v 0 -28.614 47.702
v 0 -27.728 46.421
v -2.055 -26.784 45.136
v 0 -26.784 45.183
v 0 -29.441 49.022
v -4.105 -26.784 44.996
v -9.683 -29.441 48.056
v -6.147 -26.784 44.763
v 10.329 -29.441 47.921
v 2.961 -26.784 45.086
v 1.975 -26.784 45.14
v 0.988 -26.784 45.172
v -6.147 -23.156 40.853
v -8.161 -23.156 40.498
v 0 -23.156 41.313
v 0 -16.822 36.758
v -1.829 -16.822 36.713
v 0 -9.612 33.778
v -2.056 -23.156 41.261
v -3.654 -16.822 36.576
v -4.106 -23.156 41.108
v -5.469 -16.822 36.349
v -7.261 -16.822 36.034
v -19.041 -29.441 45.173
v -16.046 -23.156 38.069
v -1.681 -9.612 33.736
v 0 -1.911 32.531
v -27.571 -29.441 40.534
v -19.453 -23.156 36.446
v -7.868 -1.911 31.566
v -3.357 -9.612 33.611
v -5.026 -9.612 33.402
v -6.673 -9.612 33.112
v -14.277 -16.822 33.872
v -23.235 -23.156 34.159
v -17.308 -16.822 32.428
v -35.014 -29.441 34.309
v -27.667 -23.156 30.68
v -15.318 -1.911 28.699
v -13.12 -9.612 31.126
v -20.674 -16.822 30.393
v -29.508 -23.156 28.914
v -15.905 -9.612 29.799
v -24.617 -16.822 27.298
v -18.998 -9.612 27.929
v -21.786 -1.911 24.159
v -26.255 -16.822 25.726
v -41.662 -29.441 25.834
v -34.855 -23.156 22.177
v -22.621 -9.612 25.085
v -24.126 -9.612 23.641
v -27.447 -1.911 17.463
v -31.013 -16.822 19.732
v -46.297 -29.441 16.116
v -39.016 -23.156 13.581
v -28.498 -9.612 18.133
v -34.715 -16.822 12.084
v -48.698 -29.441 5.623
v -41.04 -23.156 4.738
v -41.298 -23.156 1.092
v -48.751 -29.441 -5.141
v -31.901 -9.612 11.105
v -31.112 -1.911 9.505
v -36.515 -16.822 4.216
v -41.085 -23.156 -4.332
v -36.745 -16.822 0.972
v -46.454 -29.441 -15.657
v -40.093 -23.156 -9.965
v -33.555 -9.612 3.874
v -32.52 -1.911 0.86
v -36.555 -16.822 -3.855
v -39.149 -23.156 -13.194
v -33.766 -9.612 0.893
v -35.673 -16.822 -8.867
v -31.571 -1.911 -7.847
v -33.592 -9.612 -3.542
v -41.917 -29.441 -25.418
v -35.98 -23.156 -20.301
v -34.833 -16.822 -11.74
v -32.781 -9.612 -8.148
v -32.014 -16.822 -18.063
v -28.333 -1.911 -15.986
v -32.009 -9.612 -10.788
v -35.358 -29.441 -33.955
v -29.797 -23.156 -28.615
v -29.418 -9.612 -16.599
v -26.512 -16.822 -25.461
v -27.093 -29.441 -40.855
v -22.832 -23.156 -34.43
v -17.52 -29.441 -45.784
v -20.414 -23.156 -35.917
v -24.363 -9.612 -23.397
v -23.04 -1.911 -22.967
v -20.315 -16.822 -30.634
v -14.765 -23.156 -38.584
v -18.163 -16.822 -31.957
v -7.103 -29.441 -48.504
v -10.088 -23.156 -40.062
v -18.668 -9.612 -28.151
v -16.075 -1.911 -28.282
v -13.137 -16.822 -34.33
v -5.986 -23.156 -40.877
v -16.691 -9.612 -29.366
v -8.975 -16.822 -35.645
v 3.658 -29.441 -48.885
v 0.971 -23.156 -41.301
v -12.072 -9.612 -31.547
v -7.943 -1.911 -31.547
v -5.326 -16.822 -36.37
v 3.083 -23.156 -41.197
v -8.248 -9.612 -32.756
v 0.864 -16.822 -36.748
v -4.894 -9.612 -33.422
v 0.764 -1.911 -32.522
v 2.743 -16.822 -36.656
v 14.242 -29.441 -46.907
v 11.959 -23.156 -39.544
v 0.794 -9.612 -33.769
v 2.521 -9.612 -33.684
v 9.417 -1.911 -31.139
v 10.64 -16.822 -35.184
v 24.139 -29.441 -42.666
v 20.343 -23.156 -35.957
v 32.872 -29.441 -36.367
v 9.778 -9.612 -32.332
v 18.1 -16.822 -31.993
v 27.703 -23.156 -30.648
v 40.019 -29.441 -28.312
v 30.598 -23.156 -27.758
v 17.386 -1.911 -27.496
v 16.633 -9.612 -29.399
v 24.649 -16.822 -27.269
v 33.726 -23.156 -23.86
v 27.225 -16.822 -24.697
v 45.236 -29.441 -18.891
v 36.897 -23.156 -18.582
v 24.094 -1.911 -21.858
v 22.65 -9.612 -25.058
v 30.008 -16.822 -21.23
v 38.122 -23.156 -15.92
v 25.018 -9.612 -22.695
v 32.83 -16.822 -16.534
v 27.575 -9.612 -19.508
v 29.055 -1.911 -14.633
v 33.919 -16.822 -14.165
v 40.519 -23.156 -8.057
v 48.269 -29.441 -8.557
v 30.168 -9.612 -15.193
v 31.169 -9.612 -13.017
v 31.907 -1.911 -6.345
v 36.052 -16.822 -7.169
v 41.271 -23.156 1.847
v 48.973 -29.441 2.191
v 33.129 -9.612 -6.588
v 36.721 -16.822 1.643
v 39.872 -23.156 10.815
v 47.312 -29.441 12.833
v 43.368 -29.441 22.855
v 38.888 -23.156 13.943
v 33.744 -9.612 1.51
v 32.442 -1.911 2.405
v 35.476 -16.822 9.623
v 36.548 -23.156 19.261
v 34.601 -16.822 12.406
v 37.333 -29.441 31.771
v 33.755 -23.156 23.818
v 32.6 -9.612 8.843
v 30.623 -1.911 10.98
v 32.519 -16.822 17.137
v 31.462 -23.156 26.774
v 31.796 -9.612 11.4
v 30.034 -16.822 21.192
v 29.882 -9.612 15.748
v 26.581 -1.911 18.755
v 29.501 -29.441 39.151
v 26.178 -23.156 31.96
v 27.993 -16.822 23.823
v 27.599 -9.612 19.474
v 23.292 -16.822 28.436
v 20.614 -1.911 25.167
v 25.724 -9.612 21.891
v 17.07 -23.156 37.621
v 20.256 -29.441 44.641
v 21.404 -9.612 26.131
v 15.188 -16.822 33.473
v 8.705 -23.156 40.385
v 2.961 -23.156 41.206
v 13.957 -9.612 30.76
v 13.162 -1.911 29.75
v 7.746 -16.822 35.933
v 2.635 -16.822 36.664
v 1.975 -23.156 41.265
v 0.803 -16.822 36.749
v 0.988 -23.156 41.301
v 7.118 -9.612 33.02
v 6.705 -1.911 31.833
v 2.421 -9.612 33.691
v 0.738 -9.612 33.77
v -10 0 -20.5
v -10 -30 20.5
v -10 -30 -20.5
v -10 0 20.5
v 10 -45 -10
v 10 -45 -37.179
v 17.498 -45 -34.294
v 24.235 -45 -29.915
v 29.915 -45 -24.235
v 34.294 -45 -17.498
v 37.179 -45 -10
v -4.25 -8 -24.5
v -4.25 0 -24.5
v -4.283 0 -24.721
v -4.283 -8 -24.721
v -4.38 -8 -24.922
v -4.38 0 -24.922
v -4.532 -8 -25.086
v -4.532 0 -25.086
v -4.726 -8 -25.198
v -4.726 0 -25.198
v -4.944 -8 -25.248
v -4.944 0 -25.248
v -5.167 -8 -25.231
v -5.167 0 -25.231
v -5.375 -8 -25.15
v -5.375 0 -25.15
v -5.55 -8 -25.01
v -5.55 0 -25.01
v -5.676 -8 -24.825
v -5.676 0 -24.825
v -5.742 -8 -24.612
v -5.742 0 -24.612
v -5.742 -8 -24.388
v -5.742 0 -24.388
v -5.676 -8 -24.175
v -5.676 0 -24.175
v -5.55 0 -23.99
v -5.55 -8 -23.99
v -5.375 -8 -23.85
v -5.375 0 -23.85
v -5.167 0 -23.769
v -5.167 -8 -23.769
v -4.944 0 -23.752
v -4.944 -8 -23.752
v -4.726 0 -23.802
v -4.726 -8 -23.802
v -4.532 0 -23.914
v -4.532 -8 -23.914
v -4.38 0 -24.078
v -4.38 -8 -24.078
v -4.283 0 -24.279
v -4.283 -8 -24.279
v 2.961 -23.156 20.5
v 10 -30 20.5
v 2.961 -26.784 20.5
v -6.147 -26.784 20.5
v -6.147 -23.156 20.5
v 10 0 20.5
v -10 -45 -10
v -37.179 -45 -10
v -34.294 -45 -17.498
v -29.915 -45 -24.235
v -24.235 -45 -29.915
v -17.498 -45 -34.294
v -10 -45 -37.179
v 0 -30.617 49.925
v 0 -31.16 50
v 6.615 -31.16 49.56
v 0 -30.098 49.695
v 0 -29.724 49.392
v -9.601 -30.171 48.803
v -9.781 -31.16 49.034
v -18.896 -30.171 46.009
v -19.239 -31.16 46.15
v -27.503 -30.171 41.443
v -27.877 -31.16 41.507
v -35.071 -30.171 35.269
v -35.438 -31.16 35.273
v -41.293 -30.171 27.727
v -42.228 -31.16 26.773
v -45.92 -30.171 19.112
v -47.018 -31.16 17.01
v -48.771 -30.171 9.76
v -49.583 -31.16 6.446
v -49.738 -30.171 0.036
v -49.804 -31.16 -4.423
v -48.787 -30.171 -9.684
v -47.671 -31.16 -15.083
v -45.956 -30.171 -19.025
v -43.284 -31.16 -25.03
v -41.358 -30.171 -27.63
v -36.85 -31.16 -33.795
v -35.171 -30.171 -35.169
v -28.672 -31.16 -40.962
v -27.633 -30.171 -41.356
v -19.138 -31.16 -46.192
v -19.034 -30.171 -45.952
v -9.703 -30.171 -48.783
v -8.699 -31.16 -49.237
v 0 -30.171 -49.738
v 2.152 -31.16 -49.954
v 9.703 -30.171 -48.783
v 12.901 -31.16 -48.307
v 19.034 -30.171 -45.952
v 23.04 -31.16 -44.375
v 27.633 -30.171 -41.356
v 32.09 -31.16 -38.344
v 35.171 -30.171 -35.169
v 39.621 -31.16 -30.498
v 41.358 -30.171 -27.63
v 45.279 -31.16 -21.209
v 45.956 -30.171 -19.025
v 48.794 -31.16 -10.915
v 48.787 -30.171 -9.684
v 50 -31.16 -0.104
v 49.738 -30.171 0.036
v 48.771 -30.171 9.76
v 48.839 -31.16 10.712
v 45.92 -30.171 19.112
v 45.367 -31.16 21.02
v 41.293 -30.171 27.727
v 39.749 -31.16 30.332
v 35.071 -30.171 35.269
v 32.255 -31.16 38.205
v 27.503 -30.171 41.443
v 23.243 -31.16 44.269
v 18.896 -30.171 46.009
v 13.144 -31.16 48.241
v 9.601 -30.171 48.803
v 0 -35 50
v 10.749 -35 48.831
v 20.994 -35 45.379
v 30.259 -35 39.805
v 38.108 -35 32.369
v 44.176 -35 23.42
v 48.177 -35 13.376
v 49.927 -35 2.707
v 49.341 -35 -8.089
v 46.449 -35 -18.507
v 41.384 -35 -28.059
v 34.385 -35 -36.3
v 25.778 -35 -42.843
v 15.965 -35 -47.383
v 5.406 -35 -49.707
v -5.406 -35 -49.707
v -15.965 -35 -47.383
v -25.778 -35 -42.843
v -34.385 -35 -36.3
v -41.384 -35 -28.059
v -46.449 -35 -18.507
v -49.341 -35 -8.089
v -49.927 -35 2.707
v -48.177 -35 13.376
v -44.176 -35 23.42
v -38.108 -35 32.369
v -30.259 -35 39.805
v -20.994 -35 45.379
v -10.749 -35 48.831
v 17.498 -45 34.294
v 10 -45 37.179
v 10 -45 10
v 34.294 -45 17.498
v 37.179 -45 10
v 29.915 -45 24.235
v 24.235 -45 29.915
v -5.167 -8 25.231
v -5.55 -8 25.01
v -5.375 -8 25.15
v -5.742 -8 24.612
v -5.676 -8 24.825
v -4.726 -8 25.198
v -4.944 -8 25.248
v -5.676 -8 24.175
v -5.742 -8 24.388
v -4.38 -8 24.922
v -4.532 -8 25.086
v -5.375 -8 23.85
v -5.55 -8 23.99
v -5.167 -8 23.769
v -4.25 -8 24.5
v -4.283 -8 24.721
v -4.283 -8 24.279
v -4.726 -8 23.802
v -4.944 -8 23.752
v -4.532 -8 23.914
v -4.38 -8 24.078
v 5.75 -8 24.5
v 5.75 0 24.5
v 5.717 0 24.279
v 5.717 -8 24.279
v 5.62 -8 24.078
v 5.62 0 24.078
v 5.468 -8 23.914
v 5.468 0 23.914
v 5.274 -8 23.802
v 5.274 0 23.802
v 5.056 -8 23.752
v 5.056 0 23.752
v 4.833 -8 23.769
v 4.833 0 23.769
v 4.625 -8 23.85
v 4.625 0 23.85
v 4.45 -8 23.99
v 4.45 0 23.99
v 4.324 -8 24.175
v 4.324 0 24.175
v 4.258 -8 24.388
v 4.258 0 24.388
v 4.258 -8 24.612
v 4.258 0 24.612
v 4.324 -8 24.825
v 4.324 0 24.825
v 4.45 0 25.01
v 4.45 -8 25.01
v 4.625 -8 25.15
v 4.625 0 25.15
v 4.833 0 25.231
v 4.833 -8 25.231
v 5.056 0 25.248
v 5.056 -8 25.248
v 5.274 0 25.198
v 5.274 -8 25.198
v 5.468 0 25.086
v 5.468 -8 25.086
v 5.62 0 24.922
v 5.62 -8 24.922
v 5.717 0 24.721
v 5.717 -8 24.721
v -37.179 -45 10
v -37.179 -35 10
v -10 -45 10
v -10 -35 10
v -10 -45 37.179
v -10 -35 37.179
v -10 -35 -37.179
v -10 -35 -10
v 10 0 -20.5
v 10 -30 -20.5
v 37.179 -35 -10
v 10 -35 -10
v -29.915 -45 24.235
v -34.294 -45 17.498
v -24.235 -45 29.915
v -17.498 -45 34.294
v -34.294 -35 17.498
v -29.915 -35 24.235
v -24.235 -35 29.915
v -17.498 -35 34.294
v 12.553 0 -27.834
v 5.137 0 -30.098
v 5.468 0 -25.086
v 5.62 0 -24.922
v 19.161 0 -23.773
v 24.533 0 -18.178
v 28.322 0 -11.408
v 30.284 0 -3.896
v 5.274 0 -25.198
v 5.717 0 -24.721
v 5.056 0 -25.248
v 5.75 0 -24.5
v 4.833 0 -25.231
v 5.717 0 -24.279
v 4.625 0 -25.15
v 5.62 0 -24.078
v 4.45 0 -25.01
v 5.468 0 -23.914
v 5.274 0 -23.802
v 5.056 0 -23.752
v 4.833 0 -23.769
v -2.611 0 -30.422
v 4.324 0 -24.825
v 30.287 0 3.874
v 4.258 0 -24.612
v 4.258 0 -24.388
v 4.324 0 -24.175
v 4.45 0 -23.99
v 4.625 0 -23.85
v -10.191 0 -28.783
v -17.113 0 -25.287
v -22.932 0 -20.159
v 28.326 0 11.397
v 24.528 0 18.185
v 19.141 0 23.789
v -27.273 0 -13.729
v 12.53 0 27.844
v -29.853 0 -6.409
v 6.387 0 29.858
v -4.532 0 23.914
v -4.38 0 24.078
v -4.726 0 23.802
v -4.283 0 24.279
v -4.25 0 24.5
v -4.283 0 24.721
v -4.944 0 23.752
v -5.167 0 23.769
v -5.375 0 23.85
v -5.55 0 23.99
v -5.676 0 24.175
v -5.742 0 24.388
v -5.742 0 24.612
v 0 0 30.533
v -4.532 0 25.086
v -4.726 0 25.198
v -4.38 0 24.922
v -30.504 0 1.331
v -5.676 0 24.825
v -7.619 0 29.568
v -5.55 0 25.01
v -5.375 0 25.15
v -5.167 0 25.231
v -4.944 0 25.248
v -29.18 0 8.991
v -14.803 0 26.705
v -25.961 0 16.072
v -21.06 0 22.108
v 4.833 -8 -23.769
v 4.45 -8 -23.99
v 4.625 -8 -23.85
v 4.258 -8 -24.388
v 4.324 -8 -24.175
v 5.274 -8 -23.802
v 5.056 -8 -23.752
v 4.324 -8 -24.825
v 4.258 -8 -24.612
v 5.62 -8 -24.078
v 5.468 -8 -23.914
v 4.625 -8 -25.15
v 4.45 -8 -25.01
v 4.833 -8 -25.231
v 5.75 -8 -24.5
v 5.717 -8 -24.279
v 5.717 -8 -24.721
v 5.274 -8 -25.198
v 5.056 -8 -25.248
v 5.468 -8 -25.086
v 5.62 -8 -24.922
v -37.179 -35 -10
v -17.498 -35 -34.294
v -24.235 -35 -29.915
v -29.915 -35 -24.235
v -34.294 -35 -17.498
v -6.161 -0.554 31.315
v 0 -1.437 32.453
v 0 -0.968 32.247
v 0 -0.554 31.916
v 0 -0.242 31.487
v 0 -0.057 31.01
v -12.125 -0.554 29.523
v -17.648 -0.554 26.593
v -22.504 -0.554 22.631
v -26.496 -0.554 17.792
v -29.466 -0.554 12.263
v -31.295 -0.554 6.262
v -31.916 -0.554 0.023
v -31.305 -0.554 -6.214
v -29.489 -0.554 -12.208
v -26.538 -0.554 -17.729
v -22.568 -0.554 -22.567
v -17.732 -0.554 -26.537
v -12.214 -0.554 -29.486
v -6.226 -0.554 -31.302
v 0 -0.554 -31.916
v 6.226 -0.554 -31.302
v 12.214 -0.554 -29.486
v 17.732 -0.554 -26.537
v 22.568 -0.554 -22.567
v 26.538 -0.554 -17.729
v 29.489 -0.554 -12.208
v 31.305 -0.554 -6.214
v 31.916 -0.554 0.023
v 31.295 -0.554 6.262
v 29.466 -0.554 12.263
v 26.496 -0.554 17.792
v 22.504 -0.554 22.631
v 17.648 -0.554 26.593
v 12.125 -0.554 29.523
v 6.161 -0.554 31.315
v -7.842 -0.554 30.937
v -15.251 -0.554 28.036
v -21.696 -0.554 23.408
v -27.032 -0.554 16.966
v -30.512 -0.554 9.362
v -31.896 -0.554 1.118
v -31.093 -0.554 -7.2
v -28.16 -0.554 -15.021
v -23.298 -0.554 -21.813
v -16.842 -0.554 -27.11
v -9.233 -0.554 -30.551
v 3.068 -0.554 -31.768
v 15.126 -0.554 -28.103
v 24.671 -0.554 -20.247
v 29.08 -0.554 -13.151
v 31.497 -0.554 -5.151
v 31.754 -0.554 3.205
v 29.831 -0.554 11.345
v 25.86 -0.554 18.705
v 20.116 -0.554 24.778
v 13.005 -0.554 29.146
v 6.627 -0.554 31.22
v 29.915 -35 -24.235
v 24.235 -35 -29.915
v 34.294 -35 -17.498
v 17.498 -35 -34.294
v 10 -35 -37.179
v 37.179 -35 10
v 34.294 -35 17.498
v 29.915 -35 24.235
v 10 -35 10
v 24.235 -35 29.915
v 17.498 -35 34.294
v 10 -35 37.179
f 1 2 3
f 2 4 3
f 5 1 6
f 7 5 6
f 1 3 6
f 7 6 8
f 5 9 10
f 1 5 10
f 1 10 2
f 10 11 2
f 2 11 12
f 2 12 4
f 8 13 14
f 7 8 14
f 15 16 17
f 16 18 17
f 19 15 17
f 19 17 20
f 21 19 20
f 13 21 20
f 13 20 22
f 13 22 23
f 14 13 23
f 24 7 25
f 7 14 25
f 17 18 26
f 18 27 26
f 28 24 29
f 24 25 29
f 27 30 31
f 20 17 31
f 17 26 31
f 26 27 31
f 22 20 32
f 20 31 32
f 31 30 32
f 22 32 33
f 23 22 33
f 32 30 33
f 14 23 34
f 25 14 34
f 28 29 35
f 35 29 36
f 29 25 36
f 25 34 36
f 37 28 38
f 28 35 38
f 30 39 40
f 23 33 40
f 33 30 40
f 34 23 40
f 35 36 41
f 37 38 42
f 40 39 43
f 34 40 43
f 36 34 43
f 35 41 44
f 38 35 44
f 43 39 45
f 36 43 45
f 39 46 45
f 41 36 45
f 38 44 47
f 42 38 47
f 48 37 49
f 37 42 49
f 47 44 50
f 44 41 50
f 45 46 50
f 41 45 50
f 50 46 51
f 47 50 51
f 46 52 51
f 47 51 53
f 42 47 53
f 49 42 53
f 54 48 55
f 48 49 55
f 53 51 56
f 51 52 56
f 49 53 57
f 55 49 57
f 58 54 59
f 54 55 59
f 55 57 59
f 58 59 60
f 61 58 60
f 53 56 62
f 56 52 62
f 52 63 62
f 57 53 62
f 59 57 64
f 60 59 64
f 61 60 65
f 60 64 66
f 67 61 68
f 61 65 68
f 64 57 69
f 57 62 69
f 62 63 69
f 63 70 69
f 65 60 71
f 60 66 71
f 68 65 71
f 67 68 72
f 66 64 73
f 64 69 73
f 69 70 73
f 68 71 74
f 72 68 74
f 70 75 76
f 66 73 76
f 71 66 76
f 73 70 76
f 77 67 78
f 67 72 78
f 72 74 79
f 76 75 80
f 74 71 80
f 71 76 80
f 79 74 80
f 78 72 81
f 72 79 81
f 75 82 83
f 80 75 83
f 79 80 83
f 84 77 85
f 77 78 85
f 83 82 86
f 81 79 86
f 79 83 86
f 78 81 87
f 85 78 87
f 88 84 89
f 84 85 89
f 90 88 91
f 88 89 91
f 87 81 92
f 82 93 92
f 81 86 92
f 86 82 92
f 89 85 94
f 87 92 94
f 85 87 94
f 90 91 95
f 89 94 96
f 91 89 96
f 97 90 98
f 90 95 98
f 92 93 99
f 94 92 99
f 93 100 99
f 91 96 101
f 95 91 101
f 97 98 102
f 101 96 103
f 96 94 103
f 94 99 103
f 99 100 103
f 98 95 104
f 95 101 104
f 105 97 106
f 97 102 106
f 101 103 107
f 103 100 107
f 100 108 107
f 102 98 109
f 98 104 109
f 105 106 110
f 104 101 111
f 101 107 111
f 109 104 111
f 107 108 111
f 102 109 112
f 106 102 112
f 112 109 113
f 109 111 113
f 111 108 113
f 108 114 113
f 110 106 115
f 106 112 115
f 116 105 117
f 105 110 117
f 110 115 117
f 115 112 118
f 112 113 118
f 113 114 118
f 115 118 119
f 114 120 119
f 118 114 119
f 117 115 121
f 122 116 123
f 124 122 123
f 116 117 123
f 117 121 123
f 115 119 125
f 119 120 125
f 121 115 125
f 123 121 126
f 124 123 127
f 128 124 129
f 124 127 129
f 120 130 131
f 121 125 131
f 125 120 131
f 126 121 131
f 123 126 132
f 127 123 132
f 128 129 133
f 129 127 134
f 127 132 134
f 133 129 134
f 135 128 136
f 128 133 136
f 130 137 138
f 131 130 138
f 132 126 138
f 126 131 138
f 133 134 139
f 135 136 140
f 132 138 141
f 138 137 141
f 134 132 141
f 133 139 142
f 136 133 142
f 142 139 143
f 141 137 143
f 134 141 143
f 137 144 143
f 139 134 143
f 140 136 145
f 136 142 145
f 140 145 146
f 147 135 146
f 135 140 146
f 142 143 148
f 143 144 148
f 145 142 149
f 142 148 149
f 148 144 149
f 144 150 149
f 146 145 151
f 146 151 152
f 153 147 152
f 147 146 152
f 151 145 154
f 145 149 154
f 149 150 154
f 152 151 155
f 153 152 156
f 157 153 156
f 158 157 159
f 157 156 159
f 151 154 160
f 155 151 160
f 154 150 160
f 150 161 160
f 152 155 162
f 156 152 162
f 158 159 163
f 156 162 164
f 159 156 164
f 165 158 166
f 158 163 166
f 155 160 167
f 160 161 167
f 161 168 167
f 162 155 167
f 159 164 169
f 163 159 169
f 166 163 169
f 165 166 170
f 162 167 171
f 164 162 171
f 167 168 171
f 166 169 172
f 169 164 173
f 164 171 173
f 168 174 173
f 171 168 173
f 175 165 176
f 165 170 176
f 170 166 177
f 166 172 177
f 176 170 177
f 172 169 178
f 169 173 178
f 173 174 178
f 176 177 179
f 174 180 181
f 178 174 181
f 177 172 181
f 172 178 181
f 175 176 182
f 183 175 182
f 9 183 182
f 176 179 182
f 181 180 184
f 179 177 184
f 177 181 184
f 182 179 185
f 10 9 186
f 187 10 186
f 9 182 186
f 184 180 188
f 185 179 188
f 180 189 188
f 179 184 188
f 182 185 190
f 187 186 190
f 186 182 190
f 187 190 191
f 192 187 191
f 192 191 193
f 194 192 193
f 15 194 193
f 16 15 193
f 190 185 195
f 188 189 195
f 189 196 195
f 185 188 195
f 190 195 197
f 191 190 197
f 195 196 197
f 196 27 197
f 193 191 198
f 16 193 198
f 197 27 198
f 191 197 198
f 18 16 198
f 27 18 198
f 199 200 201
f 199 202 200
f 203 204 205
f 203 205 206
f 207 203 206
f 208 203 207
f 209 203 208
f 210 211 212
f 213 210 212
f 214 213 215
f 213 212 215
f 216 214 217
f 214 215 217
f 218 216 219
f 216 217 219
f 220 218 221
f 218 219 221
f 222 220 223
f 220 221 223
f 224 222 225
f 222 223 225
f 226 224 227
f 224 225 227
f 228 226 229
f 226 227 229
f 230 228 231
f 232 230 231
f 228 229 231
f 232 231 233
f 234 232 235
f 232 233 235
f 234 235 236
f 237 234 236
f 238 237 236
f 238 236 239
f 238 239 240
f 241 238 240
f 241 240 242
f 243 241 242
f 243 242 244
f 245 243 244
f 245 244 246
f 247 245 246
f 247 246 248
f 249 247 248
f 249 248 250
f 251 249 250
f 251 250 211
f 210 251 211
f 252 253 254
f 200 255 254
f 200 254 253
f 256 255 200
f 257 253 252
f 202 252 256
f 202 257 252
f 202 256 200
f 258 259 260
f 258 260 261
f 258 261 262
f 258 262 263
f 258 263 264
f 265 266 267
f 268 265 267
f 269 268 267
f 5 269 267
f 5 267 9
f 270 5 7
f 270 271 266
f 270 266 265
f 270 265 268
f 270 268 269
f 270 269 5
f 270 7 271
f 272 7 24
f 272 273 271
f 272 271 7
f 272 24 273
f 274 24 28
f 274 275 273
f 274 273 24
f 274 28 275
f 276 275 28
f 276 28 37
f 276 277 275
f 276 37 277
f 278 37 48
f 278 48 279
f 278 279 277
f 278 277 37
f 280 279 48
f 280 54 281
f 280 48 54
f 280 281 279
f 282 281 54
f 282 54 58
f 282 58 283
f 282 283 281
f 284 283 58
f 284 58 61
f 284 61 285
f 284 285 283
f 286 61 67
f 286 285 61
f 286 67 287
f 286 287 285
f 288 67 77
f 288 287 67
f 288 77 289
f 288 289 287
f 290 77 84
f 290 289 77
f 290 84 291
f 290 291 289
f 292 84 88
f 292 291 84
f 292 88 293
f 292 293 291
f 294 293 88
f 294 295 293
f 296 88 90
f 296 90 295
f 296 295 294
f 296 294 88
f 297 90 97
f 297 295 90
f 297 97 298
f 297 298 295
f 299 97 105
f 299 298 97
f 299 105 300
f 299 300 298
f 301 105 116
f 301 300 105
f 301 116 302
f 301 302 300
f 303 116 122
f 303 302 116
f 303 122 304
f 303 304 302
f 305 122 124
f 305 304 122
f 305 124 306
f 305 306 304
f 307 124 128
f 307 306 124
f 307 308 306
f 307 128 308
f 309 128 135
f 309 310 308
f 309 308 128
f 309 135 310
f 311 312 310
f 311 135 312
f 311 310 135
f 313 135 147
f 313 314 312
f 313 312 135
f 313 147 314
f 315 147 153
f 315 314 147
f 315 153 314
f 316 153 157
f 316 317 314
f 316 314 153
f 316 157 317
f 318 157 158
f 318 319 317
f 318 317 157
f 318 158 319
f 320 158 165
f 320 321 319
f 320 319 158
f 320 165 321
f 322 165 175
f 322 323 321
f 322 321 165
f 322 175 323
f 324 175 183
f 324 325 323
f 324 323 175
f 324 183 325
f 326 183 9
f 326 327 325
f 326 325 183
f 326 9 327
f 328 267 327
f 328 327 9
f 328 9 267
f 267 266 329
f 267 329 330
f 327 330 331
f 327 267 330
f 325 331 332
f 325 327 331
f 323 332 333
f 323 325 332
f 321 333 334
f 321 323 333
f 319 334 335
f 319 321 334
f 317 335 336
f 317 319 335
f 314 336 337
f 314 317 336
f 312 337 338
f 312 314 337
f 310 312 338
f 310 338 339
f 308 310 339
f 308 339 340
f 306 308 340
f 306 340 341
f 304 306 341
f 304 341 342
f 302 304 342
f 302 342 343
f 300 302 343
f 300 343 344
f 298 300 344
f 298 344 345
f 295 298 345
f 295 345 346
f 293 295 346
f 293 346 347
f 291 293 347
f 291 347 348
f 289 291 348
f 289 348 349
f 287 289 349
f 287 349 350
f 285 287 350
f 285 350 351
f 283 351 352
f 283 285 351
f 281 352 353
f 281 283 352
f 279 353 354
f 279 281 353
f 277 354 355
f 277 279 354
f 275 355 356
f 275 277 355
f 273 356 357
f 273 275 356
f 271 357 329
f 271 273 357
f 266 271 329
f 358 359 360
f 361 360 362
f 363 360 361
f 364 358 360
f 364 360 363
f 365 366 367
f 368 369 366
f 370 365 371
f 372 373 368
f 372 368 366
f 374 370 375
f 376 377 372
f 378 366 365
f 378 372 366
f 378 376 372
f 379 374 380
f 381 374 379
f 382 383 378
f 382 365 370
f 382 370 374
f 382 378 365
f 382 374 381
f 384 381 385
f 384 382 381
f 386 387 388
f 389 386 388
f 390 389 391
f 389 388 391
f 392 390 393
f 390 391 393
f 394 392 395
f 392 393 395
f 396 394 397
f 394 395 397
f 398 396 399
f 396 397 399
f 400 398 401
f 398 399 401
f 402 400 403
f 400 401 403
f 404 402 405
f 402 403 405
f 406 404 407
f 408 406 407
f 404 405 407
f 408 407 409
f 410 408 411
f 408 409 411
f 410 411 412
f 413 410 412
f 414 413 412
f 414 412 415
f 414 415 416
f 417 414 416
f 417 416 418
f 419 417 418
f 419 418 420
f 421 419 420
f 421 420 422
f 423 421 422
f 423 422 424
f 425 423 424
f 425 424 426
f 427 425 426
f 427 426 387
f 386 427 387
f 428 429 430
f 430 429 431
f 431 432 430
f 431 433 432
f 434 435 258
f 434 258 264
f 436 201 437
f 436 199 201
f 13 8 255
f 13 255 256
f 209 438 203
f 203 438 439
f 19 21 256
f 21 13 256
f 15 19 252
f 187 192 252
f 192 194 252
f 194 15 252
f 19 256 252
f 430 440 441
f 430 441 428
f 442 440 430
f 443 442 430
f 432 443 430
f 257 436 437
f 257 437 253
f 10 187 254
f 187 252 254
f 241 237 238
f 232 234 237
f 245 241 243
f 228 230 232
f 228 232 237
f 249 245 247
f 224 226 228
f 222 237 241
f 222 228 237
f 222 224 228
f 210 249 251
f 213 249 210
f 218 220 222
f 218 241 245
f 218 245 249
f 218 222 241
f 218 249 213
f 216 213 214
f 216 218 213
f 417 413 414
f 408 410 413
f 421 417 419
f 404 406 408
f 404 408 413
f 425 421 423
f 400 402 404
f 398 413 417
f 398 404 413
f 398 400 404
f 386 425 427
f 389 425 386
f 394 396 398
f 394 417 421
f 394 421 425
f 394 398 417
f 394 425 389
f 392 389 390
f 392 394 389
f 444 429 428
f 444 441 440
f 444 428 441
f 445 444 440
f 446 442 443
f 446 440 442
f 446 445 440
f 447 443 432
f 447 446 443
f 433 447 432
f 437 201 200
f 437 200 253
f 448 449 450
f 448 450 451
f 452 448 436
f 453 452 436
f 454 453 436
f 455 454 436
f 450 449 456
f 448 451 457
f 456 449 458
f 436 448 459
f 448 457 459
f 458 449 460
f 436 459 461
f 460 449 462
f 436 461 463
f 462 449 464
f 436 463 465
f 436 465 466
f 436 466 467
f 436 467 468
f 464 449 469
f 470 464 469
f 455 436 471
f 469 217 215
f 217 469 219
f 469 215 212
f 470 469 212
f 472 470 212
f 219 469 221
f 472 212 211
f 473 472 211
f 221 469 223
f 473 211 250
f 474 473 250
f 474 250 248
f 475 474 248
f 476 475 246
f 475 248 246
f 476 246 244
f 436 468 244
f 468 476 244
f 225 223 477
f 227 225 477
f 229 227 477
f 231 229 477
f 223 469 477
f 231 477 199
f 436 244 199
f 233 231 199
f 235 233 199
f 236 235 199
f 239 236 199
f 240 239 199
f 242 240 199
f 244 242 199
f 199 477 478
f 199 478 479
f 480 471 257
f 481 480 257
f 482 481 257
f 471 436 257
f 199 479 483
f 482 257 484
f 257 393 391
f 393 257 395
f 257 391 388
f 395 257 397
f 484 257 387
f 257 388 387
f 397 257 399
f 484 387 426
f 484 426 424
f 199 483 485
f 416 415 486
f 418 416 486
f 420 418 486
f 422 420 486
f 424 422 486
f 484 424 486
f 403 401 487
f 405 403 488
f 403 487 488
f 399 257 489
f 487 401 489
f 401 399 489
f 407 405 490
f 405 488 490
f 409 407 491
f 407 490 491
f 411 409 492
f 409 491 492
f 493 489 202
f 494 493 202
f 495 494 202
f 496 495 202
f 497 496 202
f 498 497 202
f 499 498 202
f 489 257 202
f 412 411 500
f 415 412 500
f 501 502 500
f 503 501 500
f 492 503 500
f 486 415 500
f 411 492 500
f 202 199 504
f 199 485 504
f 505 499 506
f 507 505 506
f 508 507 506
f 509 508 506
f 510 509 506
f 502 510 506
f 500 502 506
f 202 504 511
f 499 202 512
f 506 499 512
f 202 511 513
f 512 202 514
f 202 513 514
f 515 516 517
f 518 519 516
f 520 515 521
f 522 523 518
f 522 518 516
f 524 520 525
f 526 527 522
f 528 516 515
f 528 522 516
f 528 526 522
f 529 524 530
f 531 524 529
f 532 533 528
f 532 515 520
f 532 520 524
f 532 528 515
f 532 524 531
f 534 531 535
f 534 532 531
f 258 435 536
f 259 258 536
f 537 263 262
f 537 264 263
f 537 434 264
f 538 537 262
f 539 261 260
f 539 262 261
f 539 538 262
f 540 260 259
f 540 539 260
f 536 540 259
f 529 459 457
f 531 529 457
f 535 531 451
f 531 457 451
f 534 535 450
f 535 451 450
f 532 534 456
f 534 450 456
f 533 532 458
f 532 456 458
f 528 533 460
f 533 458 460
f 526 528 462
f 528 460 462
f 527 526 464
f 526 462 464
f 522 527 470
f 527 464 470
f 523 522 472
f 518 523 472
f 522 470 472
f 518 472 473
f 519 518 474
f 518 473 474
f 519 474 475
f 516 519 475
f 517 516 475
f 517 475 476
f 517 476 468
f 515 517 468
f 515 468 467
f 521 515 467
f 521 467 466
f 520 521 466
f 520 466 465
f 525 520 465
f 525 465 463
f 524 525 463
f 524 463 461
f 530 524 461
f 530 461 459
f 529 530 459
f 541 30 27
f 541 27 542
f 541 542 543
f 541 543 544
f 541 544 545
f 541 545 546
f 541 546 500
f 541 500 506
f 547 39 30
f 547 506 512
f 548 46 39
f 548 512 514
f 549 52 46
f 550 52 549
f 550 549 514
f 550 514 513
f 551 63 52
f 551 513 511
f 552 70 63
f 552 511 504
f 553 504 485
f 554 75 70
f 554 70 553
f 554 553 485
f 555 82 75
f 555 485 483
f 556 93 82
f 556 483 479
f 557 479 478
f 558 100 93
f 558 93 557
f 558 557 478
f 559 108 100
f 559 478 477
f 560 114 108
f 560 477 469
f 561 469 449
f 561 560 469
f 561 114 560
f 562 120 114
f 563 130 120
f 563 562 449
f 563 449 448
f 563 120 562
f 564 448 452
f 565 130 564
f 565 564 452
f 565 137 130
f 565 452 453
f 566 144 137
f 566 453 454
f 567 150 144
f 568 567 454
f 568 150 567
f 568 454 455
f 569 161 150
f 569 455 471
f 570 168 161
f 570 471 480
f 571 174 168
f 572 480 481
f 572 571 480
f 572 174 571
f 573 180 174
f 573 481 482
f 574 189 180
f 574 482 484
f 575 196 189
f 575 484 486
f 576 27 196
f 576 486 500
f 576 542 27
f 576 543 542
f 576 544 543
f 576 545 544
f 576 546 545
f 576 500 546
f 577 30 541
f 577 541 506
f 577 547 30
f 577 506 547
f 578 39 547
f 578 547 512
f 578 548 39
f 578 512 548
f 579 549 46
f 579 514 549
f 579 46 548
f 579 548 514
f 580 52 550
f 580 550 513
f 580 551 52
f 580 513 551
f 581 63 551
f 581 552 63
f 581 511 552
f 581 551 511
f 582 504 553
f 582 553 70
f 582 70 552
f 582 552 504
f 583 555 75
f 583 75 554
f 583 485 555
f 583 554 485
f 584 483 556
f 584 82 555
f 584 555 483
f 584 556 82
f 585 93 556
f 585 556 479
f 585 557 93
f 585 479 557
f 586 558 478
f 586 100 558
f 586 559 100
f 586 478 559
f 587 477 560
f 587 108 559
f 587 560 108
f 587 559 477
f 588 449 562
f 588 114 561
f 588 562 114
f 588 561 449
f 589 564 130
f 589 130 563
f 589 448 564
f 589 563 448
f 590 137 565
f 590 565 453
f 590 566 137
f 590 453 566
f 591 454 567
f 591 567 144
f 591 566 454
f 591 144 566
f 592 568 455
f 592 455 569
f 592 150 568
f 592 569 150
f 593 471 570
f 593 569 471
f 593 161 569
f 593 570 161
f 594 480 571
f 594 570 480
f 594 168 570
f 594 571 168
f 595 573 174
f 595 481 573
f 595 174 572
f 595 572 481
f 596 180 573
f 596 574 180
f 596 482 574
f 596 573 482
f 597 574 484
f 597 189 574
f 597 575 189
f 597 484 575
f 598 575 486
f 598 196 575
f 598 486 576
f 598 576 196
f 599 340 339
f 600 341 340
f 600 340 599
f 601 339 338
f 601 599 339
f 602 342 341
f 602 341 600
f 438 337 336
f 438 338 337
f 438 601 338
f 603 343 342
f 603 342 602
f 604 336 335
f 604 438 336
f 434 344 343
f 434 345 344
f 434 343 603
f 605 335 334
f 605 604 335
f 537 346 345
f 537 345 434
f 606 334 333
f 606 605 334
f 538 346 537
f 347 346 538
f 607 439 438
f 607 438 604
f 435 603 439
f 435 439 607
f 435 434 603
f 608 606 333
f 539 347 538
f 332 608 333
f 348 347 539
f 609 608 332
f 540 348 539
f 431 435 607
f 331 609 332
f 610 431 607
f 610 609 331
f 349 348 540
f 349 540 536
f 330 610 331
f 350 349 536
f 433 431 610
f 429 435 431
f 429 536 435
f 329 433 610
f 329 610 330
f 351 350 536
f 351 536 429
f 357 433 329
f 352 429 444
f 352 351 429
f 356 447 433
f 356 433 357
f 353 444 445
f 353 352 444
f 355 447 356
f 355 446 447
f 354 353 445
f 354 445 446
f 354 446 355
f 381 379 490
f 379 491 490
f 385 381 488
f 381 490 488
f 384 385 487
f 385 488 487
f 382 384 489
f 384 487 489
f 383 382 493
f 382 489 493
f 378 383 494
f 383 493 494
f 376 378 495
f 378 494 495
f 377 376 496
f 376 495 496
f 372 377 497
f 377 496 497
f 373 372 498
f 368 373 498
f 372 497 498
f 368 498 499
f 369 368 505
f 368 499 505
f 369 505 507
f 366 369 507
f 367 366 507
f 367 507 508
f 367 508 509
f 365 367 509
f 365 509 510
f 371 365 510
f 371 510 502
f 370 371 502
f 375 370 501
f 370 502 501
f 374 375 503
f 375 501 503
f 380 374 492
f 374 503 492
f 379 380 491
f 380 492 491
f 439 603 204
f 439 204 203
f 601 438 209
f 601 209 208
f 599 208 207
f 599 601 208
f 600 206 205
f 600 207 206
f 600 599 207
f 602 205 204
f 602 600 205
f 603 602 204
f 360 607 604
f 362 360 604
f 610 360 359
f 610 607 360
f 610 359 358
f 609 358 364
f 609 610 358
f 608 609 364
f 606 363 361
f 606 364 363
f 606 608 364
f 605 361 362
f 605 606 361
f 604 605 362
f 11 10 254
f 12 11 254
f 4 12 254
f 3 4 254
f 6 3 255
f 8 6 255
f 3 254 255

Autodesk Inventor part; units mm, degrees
ref_plane "YZ Plane" through (0, 0, 0) normal (1, 0, 0) x (0, 1, 0)
ref_plane "XZ Plane" through (0, 0, 0) normal (0, 1, 0) x (-1, 0, 0)
ref_plane "XY Plane" through (0, 0, 0) normal (0, 0, 1) x (1, 0, 0)
sketch "Boceto1" plane through (0, 0, 0) normal (1, 0, 0) x (0, 1, 0)
  line L0 (0, 0) -> (0, 32.5)
  line L1 (0, 0) -> (32.5, 0) construction
  line L2 (0, 0) -> (-35, 0)
  line L3 (0, 0) -> (35, 0) construction
  line L4 (-35, 0) -> (-35, 50)
  line L5 (-35, 0) -> (15, 0) construction
  line L6 (-35, 50) -> (-30, 50)
  line L7 (-35, 50) -> (-30, 50) construction
  arc A0 (-30, 50) -> (0, 32.5) centre (-0.3993, 66.2798) ccw
  dimension "d1" = 90
  dimension "d3" = 35
  dimension "d4" = 180
  dimension "d5" = 50
  dimension "d6" = 90
  dimension "d7" = 5
  dimension "d8" = 0
revolve "Revolución1" add sketch "Boceto1" angle 360 about axis through (0, 0, 0) along (0, -1, 0)
fillet "Empalme1" radius 2 2 edges at (0, 0, -32.5) (0, -30, -50)
sketch "Boceto2" plane through (0, 0, 0) normal (0, 1, 0) x (1, 0, 0)
  line L0 (10, -20.5) -> (-10, -20.5)
  line L1 (-10, -20.5) -> (-10, 20.5)
  line L2 (-10, 20.5) -> (10, 20.5)
  line L3 (10, 20.5) -> (10, -20.5)
  line L4 (10, -20.5) -> (-10, 20.5) construction
  line L5 (-10, -20.5) -> (10, 20.5) construction
  line L6 (10, -20.5) -> (-10, -20.5)
  line L7 (10, -27) -> (10, -20.5)
  line L8 (10, -20.5) -> (-10, -20.5)
  line L9 (10, -23.5) -> (10, -20.5)
  line L10 (-10, -20.5) -> (-6, -20.5) construction
  circle A0 centre (-5, -24.5) radius 2.2
  circle A1 centre (5, -24.5) radius 2.2
  line L11 (0, 0) -> (-10, 0)
  circle A2 centre (-5, 24.5) radius 2.2
  circle A3 centre (5, 24.5) radius 2.2
  circle A4 centre (-5, 24.5) radius 0.75
  circle A5 centre (5, 24.5) radius 0.75
  circle A6 centre (-5, -24.5) radius 0.75
  circle A7 centre (5, -24.5) radius 0.75
  dimension "d11" = 20
  dimension "d12" = 41
  dimension "d34" = 1.5
  dimension "d35" = 1.5
  dimension "d36" = 1.5
  dimension "d37" = 1.5
extrude "Extrusión1" cut sketch "Boceto2" against normal blind 8 contours A0 | A1 | A2 | A3 | A4 | A5 | A6 | A7
extrude "Extrusión2" cut sketch "Boceto2" against normal blind 30 contours L0 L1 L2 L3
sketch "Boceto3" plane through (0, -35, 0) normal (0, -1, 0) x (1, 0, 0)
  circle A0 centre (0, 0) radius 38.5
  line L0 (38.5, 5) -> (5, 5)
  line L1 (-5, 5) -> (-38.5, 5)
  line L2 (5, 38.5) -> (5, 5)
  line L3 (5, -5) -> (5, -38.5)
  line L4 (38.5, -5) -> (5, -5)
  line L5 (-5, -5) -> (-38.5, -5)
  line L6 (-5, 38.5) -> (-5, 5)
  line L7 (-5, -5) -> (-5, -38.5)
  point P0 (38.1739, -5)
  point P1 (5, -38.1739)
  point P2 (-5, -38.1739)
  point P3 (-38.1739, -5)
  point P4 (-5, 38.1739)
  point P5 (-38.1739, 5)
  point P6 (5, 38.1739)
  point P7 (38.1739, 5)
extrude "Extrusión3" add sketch "Boceto3" along normal blind 10 contours L0 L2 A0 | A0 L3 L4 | L6 L1 A0 | A0 L5 L7
extrude "Extrusión4" add sketch "Boceto2" against normal blind 31.25 contours A0 | A1 | A2 | A3
sketch "Boceto4" plane through (0, -35, 0) normal (0, -1, 0) x (1, 0, 0)
  line L0 (0, 0) -> (0, -39.1939)
  line L1 (0, -39.1939) -> (0, 39.081)
  line L2 (0, 0) -> (40.6258, 0)
  line L3 (40.6258, 0) -> (-47.6063, 0)
  line L4 (5, 5) -> (38.1739, 5) projected
  line L5 (-5, 5) -> (5, 5)
  line L6 (-10, -57.3754) -> (10, -57.3754)
  line L7 (10, -57.3754) -> (10, 57.3754)
  line L8 (10, 57.3754) -> (-10, 57.3754)
  line L9 (-10, 57.3754) -> (-10, -57.3754)
  line L10 (-10, -57.3754) -> (10, 57.3754) construction
  line L11 (10, -57.3754) -> (-10, 57.3754) construction
  line L12 (-59.832, 10) -> (59.832, 10)
  line L13 (59.832, 10) -> (59.832, -10)
  line L14 (59.832, -10) -> (-59.832, -10)
  line L15 (-59.832, -10) -> (-59.832, 10)
  line L16 (-59.832, 10) -> (59.832, -10) construction
  line L17 (59.832, 10) -> (-59.832, -10) construction
  point P0 (-10, -10)
  point P1 (10, -10)
  point P2 (10, 10)
  point P3 (-10, 10)
  dimension "d40" = 20
  dimension "d41" = 20
extrude "Extrusión5" cut sketch "Boceto4" along normal blind 100.25
sketch "Boceto5" plane through (10, 0, 20.5) normal (0, 0, -1) x (-1, 0, 0)
  line L0 (7.039, -26.7842) -> (16.1468, -26.7842)
  line L1 (16.1468, -26.7842) -> (16.1468, -23.156)
  line L2 (16.1468, -23.156) -> (7.039, -23.156)
  line L3 (7.039, -23.156) -> (7.039, -26.7842)
  point P0 (10, 0)
extrude "Extrusión6" cut sketch "Boceto5" against normal blind 100.25
